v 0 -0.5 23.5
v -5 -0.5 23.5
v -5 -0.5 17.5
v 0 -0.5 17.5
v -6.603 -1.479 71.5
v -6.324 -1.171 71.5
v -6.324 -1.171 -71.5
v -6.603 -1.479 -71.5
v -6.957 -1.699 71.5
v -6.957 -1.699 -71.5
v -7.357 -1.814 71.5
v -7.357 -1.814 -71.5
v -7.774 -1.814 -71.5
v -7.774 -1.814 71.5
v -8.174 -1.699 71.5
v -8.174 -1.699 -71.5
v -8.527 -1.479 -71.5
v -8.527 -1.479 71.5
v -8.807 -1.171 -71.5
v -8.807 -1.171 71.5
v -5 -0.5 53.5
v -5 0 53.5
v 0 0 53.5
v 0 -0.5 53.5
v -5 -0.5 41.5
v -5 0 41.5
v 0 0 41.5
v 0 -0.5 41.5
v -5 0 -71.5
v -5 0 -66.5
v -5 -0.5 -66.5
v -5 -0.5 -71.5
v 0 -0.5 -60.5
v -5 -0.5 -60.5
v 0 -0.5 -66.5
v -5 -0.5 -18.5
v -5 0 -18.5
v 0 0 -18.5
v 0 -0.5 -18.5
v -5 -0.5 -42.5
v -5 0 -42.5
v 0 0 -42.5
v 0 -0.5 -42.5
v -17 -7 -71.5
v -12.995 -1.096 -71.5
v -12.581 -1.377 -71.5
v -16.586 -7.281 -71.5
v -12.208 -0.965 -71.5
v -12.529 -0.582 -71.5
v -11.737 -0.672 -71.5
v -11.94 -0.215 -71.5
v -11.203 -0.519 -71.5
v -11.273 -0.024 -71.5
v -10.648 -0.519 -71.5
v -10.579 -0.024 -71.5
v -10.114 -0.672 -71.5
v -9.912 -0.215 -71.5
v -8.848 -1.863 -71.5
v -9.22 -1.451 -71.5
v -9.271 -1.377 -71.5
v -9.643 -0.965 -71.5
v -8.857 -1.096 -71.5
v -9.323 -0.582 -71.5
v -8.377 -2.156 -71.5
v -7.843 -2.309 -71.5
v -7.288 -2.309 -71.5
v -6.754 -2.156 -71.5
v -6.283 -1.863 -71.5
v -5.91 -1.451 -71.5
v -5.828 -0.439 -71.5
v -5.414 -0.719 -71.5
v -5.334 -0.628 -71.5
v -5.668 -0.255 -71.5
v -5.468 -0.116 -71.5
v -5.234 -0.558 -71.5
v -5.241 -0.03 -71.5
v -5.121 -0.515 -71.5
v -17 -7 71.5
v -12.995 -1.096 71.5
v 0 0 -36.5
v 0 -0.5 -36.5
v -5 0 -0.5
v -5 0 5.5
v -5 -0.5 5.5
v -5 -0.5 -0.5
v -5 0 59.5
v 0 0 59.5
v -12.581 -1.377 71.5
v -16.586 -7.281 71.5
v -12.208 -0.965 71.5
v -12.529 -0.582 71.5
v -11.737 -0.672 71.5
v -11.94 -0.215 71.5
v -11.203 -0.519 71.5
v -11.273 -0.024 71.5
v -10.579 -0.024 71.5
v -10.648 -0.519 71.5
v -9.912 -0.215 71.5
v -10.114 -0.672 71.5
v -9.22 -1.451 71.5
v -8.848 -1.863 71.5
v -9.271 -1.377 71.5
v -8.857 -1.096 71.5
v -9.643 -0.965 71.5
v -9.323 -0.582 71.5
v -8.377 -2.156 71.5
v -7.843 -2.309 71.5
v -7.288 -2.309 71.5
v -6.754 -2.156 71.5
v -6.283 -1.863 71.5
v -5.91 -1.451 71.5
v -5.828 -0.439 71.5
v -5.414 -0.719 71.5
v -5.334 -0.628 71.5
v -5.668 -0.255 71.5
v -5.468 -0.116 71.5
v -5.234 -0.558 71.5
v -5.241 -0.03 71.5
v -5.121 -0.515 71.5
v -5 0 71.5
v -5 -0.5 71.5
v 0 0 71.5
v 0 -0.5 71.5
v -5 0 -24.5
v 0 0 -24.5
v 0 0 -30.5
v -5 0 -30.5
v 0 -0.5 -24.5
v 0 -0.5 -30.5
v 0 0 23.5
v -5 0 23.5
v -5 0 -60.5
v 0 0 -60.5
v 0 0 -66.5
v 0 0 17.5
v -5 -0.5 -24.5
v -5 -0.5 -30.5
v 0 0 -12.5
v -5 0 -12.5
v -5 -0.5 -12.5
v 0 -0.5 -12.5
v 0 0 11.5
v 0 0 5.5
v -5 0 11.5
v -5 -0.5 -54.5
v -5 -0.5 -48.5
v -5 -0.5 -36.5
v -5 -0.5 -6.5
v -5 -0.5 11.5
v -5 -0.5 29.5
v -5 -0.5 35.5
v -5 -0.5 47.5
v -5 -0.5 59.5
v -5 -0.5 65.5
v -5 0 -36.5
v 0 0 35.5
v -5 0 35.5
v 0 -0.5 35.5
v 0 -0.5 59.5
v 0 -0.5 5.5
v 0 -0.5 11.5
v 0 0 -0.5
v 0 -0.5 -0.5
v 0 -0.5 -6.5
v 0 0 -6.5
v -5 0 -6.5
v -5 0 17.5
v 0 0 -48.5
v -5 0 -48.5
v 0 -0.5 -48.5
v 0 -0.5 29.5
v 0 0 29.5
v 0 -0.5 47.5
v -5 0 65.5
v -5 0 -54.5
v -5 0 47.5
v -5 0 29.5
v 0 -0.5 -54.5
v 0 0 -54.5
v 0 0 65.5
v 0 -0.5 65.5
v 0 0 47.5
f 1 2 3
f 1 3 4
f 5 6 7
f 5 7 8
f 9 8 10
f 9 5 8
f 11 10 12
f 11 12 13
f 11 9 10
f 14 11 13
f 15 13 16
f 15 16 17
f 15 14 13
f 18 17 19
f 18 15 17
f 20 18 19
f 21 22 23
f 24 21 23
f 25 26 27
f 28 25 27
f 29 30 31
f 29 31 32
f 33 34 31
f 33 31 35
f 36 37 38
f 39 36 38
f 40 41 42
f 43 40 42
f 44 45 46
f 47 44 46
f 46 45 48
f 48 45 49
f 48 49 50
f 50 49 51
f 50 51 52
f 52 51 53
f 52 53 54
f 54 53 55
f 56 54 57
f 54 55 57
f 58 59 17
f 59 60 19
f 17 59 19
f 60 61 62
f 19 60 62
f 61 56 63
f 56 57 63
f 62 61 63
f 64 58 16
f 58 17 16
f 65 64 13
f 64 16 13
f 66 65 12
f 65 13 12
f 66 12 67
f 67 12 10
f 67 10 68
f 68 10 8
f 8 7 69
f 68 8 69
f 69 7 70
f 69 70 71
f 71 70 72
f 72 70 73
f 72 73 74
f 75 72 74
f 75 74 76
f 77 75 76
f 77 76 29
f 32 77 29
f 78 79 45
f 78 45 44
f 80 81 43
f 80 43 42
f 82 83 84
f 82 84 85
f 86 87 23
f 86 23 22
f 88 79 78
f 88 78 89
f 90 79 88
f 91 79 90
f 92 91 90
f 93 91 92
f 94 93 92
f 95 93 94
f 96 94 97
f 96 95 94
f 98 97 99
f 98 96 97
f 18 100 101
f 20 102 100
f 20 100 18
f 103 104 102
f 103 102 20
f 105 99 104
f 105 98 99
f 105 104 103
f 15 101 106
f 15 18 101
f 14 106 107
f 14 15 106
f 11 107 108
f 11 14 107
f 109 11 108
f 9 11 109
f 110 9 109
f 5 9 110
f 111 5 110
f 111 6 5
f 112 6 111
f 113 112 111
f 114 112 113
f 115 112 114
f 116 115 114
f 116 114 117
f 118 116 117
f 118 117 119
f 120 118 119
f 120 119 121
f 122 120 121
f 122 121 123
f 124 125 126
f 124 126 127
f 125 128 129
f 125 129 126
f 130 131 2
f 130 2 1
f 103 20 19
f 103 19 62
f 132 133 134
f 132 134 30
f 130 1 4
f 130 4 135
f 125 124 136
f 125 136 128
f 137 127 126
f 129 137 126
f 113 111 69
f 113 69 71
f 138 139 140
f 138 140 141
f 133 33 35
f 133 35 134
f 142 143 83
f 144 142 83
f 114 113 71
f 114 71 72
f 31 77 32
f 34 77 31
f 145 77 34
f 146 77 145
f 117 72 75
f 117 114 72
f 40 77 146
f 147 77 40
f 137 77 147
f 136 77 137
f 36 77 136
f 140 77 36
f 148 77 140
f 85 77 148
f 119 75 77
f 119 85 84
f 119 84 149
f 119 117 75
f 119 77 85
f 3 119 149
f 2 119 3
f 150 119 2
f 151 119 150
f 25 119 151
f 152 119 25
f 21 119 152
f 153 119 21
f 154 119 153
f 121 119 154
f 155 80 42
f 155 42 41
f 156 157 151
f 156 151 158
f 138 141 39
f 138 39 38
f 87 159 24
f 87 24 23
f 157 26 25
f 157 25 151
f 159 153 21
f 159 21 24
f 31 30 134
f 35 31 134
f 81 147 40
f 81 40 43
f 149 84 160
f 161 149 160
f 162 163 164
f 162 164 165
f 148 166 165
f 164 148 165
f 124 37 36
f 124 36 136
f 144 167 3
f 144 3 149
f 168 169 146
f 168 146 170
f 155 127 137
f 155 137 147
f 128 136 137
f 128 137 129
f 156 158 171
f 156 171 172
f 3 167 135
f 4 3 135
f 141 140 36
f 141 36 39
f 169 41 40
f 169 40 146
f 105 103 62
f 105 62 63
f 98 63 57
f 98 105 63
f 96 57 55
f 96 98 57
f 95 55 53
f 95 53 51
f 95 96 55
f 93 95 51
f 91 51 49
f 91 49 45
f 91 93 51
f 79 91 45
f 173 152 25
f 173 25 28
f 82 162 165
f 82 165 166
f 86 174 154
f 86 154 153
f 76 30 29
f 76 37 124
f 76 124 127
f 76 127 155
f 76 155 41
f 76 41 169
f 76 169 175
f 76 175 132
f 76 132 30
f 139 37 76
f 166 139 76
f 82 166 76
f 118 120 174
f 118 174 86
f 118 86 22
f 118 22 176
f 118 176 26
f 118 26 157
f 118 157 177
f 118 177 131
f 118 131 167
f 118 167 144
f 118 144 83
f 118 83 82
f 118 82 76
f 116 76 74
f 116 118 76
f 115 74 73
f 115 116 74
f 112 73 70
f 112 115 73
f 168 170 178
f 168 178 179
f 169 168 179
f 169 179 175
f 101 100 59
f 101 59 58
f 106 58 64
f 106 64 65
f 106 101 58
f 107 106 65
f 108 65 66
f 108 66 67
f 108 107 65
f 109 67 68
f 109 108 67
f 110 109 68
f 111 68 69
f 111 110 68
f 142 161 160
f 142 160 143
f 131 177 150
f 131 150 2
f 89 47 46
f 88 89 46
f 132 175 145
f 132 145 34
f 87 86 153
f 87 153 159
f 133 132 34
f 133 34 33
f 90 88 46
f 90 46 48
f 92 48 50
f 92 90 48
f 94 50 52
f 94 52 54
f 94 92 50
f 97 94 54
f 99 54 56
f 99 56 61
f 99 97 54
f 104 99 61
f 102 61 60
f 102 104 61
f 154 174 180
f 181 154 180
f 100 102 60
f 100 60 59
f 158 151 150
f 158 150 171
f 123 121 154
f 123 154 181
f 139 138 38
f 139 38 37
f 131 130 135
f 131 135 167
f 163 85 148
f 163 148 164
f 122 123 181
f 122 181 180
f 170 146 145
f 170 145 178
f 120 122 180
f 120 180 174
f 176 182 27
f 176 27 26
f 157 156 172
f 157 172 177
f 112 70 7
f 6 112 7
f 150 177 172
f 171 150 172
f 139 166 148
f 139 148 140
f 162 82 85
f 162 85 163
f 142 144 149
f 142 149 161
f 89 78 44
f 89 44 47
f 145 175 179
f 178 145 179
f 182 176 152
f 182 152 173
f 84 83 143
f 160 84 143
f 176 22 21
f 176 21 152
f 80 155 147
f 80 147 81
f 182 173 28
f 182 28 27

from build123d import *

# Parameters (mm, degrees)
BOSS_EXTRUDE1_DEPTH = 71.5
SKETCH3_W           = 5
SKETCH3_H           = 6
CUT_EXTRUDE1_DEPTH  = 74.85295489
LPATTERN1_COUNT     = 12
LPATTERN1_PITCH     = 12


with BuildPart() as part:
    # Sketch1 → Boss-Extrude1 (new, symmetric)
    with BuildSketch(Plane.XY):
        with BuildLine():
            Line((0, 0), (-5, 0))
            ThreePointArc((-5, 0), (-5.468268863, -0.11641397), (-5.827511651, -0.438551456))
            Line((-5.827511651, -0.438551456), (-6.324130952, -1.170512135))
            ThreePointArc((-6.324130952, -1.170512135), (-7.565398428, -1.828339319), (-8.806665905, -1.170512135))
            Line((-8.806665905, -1.170512135), (-8.856963859, -1.096378639))
            ThreePointArc((-8.856963859, -1.096378639), (-10.925742986, 0), (-12.994522113, -1.096378639))
            Line((-12.994522113, -1.096378639), (-17, -7))
            Line((-17, -7), (-16.586244175, -7.280724272))
            Line((-16.586244175, -7.280724272), (-12.580766288, -1.377102912))
            ThreePointArc((-12.580766288, -1.377102912), (-10.925742986, -0.5), (-9.270719684, -1.377102912))
            Line((-9.270719684, -1.377102912), (-9.22042173, -1.451236407))
            ThreePointArc((-9.22042173, -1.451236407), (-7.565398428, -2.328339319), (-5.910375127, -1.451236407))
            Line((-5.910375127, -1.451236407), (-5.413755825, -0.719275728))
            ThreePointArc((-5.413755825, -0.719275728), (-5.234134431, -0.558206985), (-5, -0.5))
            Line((-5, -0.5), (0, -0.5))
            Line((0, -0.5), (0, 0))
        make_face()
    extrude(amount=BOSS_EXTRUDE1_DEPTH, both=True)

    # Sketch3 → Cut-Extrude1 (cut, through all)
    with BuildSketch(Plane(origin=(0, 0, 0), x_dir=(1, 0, 0), z_dir=(0, 1, 0))):
        with Locations((-2.5, -62.5)):
            Rectangle(SKETCH3_W, SKETCH3_H)
    cut_extrude1 = extrude(amount=-CUT_EXTRUDE1_DEPTH, mode=Mode.SUBTRACT)

    # LPattern1: Cut-Extrude1 ×12
    with Locations(*[(0, 0, -i * LPATTERN1_PITCH) for i in range(1, LPATTERN1_COUNT)]):
        add(cut_extrude1, mode=Mode.SUBTRACT)


solid = part.part
